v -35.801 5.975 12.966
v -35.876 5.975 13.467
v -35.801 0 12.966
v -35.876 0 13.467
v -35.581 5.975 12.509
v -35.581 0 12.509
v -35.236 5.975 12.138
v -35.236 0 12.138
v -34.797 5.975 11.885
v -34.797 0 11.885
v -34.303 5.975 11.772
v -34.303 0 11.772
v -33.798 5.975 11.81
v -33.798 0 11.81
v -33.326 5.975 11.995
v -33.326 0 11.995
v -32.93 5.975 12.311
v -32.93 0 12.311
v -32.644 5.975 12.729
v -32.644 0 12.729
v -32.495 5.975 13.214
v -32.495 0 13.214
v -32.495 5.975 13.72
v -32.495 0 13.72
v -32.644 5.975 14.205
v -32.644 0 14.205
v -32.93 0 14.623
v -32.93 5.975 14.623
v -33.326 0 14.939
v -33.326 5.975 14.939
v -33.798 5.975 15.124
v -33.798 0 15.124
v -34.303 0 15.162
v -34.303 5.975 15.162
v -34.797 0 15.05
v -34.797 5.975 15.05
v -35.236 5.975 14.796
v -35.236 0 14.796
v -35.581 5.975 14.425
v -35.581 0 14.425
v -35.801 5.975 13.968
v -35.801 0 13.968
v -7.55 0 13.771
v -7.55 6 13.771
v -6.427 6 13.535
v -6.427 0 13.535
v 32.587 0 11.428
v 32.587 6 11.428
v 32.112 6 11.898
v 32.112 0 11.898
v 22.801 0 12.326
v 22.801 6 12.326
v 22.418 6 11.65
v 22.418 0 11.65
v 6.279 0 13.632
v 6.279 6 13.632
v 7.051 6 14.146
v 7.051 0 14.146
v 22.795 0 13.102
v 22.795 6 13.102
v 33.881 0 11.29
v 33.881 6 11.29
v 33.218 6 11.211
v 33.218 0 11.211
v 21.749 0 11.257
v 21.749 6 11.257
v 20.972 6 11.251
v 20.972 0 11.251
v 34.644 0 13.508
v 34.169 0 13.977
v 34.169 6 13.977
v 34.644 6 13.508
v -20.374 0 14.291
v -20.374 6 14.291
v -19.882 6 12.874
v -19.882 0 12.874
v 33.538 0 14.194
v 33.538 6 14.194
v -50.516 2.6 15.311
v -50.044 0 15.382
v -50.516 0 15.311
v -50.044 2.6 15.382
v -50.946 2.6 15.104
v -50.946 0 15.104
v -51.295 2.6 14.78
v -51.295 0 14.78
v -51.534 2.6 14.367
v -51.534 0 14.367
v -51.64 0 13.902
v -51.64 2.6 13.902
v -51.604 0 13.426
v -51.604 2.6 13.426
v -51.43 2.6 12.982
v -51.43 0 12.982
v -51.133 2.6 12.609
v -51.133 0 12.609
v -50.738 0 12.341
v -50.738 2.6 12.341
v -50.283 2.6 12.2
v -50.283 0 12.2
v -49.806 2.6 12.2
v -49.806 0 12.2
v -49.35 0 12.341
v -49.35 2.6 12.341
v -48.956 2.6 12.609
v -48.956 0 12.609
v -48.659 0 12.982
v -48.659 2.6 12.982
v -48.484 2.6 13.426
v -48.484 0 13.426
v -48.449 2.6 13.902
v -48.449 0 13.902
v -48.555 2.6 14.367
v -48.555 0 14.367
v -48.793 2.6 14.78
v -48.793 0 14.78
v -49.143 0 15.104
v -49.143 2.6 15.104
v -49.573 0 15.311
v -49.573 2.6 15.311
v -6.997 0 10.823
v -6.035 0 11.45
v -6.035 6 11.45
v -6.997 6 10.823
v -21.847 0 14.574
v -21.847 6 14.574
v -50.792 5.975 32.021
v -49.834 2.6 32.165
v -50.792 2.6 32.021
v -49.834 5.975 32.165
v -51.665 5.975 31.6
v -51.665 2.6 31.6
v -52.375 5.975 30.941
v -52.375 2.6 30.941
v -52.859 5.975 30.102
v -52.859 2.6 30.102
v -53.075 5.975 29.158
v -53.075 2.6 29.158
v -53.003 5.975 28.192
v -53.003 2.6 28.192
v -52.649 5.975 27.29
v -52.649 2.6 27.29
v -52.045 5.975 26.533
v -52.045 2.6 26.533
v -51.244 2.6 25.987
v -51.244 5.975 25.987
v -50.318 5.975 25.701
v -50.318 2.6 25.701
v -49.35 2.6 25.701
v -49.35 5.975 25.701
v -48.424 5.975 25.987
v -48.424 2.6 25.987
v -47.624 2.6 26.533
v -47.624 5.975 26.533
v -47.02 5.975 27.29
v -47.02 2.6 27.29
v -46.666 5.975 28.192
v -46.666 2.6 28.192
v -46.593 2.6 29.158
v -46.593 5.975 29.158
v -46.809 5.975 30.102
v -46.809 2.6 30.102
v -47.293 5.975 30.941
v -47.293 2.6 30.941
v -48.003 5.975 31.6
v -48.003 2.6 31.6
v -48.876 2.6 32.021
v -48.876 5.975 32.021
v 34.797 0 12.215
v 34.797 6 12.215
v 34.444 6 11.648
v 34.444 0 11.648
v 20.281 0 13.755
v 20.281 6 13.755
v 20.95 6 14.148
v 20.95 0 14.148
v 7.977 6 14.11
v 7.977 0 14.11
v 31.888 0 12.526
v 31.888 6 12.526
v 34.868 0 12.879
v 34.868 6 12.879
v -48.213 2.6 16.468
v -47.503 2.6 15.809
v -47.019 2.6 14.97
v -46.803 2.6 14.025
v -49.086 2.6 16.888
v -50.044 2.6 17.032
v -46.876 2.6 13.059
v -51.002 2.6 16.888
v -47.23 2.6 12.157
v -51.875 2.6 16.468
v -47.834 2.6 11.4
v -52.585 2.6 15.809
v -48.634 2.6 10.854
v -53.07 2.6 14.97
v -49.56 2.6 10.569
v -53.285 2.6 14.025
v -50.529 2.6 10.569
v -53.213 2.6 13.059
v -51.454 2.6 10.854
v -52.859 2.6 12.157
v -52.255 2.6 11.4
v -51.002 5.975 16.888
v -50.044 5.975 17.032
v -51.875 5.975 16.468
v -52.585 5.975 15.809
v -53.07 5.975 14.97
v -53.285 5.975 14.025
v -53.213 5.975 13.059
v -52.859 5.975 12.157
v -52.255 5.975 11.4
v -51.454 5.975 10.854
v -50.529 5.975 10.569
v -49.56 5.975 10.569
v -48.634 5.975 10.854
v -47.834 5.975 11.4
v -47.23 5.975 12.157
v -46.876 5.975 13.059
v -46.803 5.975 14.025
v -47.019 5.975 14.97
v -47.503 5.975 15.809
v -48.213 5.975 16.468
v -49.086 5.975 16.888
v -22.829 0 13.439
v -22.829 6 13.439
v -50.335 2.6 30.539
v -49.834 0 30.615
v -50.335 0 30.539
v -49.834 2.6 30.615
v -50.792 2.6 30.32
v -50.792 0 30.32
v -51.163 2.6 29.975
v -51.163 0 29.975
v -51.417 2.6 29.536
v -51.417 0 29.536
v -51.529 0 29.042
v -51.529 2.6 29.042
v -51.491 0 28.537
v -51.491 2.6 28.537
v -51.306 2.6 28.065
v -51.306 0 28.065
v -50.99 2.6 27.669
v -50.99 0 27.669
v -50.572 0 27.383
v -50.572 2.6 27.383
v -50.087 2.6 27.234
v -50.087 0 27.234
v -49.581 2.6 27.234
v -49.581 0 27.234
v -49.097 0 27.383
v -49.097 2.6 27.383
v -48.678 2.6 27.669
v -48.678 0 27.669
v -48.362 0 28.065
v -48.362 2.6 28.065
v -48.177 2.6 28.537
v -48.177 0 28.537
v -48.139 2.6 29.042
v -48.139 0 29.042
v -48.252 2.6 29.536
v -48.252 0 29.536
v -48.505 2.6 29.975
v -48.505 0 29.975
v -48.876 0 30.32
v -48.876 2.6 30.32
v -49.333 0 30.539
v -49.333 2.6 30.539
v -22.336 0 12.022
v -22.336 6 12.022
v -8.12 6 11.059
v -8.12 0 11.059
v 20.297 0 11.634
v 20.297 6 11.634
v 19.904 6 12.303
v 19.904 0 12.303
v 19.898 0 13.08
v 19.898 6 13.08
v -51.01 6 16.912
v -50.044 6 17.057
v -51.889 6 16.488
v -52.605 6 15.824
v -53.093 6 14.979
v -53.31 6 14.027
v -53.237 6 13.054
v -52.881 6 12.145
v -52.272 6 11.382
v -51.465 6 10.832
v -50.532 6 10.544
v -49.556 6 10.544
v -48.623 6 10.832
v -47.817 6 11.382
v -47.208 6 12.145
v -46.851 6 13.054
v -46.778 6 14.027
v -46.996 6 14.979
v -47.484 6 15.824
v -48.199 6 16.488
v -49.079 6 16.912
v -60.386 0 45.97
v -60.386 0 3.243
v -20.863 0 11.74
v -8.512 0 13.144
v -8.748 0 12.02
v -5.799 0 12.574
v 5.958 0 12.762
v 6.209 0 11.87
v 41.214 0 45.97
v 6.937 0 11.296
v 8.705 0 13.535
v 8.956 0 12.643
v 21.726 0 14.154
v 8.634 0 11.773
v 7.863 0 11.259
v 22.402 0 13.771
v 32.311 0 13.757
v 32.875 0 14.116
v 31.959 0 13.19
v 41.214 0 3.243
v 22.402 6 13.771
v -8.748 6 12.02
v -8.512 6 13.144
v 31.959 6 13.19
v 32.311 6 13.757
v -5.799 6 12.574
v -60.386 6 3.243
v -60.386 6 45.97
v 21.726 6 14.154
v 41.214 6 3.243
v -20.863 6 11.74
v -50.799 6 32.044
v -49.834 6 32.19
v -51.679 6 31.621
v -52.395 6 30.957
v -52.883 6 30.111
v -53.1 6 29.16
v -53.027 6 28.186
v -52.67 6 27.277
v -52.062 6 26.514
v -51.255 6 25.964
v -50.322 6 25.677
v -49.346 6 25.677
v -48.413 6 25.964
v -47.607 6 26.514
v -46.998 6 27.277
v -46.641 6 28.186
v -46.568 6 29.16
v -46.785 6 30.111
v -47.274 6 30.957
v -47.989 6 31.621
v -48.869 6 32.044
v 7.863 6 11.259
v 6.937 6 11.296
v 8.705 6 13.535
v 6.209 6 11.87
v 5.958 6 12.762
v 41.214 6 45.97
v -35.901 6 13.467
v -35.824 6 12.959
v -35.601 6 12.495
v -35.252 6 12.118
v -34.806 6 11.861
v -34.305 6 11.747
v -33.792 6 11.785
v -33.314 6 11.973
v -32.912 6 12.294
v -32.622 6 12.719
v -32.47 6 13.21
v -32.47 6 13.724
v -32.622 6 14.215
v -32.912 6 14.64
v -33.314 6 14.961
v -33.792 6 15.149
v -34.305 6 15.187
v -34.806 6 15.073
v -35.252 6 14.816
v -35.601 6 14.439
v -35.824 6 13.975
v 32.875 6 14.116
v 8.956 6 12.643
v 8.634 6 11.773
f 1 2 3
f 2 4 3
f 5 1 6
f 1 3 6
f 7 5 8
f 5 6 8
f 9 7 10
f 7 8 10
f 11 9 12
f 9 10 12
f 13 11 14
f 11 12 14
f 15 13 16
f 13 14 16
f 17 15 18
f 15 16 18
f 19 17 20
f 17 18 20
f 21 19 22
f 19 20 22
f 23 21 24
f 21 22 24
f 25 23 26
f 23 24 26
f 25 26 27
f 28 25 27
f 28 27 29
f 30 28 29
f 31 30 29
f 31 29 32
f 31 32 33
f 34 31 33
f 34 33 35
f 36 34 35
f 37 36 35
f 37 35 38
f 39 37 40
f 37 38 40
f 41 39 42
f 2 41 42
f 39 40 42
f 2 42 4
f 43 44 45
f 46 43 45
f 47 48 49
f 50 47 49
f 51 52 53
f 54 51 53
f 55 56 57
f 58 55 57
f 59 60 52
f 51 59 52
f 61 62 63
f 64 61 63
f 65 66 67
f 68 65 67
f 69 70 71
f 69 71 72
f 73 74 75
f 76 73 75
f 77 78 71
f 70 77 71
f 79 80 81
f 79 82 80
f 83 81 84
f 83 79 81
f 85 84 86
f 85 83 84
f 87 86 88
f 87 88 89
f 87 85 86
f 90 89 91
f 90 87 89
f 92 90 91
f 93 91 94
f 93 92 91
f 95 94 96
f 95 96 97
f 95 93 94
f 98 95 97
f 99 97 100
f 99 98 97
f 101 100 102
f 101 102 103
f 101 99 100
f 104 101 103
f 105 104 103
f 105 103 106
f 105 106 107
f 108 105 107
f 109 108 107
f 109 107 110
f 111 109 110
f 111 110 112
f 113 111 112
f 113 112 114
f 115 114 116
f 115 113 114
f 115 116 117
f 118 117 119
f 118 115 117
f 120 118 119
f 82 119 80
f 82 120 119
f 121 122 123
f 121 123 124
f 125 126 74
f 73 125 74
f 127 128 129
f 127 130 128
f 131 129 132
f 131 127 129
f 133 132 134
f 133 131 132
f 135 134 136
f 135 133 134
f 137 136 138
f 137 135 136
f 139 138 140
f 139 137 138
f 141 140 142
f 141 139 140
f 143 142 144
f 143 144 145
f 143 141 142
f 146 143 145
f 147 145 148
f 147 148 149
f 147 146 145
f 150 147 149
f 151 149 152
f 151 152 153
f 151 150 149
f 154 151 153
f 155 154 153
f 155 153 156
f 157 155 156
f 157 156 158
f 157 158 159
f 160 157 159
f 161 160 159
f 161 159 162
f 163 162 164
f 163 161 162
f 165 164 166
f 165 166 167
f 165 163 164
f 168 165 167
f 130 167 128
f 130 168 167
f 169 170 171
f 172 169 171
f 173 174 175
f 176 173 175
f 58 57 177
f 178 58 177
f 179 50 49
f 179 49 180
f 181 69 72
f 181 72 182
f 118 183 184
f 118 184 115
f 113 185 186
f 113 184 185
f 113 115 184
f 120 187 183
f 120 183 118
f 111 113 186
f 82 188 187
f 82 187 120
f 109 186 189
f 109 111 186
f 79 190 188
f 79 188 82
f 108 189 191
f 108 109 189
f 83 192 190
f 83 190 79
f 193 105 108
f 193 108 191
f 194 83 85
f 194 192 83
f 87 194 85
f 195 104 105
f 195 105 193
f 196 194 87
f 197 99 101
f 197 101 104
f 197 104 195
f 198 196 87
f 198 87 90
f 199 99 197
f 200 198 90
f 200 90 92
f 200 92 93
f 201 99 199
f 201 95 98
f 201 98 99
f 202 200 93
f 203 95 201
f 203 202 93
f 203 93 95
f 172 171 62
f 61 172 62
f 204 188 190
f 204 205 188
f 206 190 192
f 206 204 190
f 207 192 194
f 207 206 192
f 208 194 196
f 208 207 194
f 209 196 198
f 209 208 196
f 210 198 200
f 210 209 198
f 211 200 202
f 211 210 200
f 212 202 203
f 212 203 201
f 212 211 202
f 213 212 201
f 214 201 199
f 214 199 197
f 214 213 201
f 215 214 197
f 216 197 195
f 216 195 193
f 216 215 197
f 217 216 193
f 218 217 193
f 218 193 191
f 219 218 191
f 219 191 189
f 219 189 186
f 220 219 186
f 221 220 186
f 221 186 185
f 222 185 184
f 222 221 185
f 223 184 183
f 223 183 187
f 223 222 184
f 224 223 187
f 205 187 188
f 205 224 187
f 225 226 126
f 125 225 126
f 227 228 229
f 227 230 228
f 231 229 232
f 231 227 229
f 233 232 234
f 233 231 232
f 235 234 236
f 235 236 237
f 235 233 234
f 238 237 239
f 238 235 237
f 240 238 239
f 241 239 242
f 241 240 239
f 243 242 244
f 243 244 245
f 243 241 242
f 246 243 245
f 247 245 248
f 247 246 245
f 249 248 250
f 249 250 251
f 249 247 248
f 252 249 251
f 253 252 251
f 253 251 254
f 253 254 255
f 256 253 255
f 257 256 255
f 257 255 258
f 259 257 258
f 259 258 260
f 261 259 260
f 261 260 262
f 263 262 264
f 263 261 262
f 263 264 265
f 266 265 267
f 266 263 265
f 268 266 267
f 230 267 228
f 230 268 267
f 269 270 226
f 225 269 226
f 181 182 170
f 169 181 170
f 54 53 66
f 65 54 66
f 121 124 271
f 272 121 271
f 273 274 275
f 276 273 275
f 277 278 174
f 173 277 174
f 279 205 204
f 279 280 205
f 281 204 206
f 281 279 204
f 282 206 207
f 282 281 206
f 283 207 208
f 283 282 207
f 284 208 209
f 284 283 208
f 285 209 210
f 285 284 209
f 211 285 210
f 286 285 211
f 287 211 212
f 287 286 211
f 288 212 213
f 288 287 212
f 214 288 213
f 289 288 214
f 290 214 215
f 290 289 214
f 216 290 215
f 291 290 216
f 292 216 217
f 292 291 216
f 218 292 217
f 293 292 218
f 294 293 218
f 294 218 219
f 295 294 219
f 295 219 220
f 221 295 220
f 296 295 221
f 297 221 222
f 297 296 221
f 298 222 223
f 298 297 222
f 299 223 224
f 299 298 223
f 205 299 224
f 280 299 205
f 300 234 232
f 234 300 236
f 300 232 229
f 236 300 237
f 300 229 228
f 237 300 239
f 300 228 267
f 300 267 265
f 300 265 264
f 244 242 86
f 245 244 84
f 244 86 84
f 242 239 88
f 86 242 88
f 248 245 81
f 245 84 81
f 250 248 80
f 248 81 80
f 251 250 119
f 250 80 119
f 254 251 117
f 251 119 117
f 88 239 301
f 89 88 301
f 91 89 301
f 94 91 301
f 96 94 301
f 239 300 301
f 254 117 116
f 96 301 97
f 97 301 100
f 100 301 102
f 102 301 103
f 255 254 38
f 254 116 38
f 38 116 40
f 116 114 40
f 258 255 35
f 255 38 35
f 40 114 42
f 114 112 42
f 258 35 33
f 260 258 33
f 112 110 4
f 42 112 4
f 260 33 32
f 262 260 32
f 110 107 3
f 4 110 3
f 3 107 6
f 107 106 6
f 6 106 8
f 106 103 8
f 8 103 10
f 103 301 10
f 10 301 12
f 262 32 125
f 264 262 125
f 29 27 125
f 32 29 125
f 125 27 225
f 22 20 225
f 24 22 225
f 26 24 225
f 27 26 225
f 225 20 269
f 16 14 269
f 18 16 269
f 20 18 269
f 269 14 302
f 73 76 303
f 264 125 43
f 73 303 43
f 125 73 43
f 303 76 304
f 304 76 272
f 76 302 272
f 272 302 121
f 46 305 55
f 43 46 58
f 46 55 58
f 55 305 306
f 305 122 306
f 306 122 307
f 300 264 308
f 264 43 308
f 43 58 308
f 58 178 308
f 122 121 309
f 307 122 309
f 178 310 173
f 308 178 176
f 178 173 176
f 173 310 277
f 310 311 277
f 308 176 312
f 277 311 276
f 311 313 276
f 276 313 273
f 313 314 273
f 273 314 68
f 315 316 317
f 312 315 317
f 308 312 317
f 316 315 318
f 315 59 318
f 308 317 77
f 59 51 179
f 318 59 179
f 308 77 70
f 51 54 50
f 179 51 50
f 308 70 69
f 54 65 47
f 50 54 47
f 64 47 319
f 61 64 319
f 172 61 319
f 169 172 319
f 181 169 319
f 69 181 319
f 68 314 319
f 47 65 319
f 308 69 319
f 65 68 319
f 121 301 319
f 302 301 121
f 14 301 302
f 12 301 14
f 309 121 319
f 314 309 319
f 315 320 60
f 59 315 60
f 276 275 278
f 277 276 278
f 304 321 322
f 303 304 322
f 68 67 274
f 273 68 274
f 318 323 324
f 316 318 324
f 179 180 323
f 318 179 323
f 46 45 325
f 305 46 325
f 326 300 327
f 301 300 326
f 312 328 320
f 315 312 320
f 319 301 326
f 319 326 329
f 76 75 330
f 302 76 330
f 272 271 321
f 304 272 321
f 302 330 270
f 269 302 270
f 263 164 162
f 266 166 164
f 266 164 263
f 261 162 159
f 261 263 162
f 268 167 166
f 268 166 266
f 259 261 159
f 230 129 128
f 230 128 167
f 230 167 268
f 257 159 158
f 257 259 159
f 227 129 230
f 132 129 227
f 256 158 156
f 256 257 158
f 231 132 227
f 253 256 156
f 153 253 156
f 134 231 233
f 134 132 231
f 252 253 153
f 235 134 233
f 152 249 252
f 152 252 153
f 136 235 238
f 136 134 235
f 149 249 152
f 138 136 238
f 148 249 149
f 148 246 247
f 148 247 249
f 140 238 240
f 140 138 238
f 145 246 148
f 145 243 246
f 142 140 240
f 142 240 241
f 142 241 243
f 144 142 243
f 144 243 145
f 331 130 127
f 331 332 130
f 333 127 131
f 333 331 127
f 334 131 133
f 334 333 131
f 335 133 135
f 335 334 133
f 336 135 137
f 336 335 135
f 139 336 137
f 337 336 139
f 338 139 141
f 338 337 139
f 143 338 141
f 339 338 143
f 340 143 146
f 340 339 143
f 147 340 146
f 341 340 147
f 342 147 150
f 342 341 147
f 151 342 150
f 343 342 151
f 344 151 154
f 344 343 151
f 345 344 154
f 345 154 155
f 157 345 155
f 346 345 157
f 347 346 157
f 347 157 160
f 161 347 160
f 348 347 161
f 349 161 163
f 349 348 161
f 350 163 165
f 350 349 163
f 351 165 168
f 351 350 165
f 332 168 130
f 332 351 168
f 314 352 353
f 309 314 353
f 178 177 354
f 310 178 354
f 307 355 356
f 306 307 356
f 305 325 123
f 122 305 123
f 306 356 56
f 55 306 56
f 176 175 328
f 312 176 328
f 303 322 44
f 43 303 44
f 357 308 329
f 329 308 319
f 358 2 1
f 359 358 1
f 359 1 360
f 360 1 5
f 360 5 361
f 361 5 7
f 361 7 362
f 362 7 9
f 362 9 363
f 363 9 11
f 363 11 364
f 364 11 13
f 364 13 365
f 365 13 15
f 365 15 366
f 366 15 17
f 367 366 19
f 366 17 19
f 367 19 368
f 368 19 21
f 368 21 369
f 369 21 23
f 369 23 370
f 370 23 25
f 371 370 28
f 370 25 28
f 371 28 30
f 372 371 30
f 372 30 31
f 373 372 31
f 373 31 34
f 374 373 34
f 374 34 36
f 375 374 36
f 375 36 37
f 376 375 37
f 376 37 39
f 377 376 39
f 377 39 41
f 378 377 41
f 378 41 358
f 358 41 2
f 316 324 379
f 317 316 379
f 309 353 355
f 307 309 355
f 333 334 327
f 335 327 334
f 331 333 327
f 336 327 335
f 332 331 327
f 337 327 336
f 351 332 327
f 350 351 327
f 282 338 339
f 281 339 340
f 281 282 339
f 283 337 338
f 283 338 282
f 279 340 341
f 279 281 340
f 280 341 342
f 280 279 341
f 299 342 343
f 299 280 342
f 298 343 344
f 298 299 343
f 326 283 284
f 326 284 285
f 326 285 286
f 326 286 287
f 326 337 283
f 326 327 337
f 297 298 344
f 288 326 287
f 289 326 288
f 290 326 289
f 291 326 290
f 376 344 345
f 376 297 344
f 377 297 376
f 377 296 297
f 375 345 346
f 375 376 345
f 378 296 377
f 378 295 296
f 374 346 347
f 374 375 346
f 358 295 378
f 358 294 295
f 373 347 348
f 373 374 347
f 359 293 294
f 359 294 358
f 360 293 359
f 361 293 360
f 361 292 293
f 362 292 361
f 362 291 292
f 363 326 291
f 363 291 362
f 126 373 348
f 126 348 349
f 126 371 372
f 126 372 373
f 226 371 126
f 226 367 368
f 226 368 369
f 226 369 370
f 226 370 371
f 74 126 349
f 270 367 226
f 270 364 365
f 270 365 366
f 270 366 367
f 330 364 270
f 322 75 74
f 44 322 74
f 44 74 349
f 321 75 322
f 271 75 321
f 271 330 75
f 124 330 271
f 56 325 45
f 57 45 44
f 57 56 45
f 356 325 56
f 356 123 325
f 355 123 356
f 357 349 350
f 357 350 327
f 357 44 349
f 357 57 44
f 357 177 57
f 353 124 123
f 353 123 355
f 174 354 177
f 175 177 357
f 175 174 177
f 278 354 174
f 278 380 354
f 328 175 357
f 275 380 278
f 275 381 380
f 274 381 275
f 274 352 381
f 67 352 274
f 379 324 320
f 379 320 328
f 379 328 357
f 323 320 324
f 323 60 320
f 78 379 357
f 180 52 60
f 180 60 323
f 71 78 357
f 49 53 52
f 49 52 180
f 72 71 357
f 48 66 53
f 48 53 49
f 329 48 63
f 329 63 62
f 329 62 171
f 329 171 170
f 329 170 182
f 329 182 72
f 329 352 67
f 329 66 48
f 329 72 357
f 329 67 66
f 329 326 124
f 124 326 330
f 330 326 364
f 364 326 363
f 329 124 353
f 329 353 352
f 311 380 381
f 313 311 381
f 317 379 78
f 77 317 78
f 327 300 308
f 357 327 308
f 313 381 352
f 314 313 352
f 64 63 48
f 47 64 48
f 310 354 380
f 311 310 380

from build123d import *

# Parameters (mm, degrees)
SKETCH1_W                      = 101.6
SKETCH1_H                      = 42.727601577
BOSS_EXTRUDE2_DEPTH            = 6
M3_CLEARANCE_HOLE1_D           = 3.4
M3_CLEARANCE_HOLE1_CSINK_D     = 3.45
M3_CLEARANCE_HOLE1_CSINK_ANGLE = 90
CUT_EXTRUDE1_DEPTH             = 77.129253004
CUT_EXTRUDE2_DEPTH             = 77.129253004


with BuildPart() as part:
    # Sketch1 → Boss-Extrude2 (new body)
    with BuildSketch(Plane(origin=(0, 0, 0), x_dir=(1, 0, 0), z_dir=(0, 1, 0))):
        with Locations((-9.585511853, -24.606332138)):
            Rectangle(SKETCH1_W, SKETCH1_H)
    extrude(amount=BOSS_EXTRUDE2_DEPTH)

    # Sketch5 → CBORE for M3 Hex Socket Head Cap Screw1 (revolve, cut)
    with BuildSketch(Plane(origin=(-50.044280369, 6, 13.782297963), x_dir=(0, 0, 1), z_dir=(1, 0, 0))):
        Polygon((0, 0), (0, 6), (1.6, 6), (1.6, 3.4), (3.25, 3.4), (3.25, 0.025), (3.275, 0), align=None)
    revolve(axis=Axis((-50.044280369, 12.35, 13.782297963), (0, -1, 0)), mode=Mode.SUBTRACT)

    # Sketch8 → CBORE for M3 Hex Socket Head Cap Screw2 (revolve, cut)
    with BuildSketch(Plane(origin=(-49.834104948, 6, 28.914928265), x_dir=(0, 0, 1), z_dir=(1, 0, 0))):
        Polygon((0, 0), (0, 6), (1.7, 6), (1.7, 3.4), (3.25, 3.4), (3.25, 0.025), (3.275, 0), align=None)
    revolve(axis=Axis((-49.834104948, 12.35, 28.914928265), (0, -1, 0)), mode=Mode.SUBTRACT)

    # M3 Clearance Hole1 (through all)
    with Locations(Plane(origin=(0, 6, 0), x_dir=(1, 0, 0), z_dir=(0, 1, 0))):
        with Locations((-34.176036094, -13.467034832)):
            CounterSinkHole(M3_CLEARANCE_HOLE1_D / 2, M3_CLEARANCE_HOLE1_CSINK_D / 2, counter_sink_angle=M3_CLEARANCE_HOLE1_CSINK_ANGLE)

    # Sketch17 → Cut-Extrude1 (cut, through all)
    with BuildSketch(Plane(origin=(0, 6, 0), x_dir=(1, 0, 0), z_dir=(0, 1, 0))):
        Polygon((-22.828510557, -13.43914031), (-21.847349351, -14.573742746), (-20.374174215, -14.291333434), (-19.882160285, -12.874321687), (-20.863321491, -11.739719251), (-22.336496627, -12.022128562), align=None)
    extrude(amount=-CUT_EXTRUDE1_DEPTH, mode=Mode.SUBTRACT)

    # Sketch18 → Cut-Extrude2 (cut, through all)
    with BuildSketch(Plane(origin=(0, 6, 0), x_dir=(1, 0, 0), z_dir=(0, 1, 0))):
        Polygon((-6.426767494, -13.535213432), (-5.799321109, -12.573792338), (-6.035476891, -11.45029337), (-6.996897984, -10.822846985), (-8.120396952, -11.059002767), (-8.747843337, -12.02042386), (-8.511687556, -13.143922829), (-7.550266462, -13.771369213), align=None)
        Polygon((8.704589907, -13.535213432), (8.955713542, -12.642823133), (8.634342974, -11.773257447), (7.863230836, -11.258660909), (6.936915756, -11.295591908), (6.209218611, -11.869944056), (5.958094976, -12.762334355), (6.279465545, -13.631900041), (7.050577683, -14.146496579), (7.976892762, -14.10956558), align=None)
        Polygon((22.401860914, -13.771369213), (22.795252298, -13.101944907), (22.801227077, -12.32551076), (22.418184314, -11.650111674), (21.748760007, -11.25672029), (20.97232586, -11.250745511), (20.296926775, -11.633788275), (19.903535391, -12.303212581), (19.897560612, -13.079646728), (20.280603376, -13.755045814), (20.950027682, -14.148437198), (21.726461829, -14.154411977), align=None)
        Polygon((34.168977745, -13.977066564), (34.643623673, -13.507650611), (34.867592928, -12.878780301), (34.796525653, -12.215011111), (34.444497593, -11.647810671), (33.881232222, -11.289519984), (33.218291156, -11.211102914), (32.586978002, -11.428090924), (32.112332074, -11.897506877), (31.888362819, -12.526377187), (31.959430094, -13.190146377), (32.311458154, -13.757346817), (32.874723525, -14.115637504), (33.537664591, -14.194054574), align=None)
    extrude(amount=-CUT_EXTRUDE2_DEPTH, mode=Mode.SUBTRACT)


solid = part.part
